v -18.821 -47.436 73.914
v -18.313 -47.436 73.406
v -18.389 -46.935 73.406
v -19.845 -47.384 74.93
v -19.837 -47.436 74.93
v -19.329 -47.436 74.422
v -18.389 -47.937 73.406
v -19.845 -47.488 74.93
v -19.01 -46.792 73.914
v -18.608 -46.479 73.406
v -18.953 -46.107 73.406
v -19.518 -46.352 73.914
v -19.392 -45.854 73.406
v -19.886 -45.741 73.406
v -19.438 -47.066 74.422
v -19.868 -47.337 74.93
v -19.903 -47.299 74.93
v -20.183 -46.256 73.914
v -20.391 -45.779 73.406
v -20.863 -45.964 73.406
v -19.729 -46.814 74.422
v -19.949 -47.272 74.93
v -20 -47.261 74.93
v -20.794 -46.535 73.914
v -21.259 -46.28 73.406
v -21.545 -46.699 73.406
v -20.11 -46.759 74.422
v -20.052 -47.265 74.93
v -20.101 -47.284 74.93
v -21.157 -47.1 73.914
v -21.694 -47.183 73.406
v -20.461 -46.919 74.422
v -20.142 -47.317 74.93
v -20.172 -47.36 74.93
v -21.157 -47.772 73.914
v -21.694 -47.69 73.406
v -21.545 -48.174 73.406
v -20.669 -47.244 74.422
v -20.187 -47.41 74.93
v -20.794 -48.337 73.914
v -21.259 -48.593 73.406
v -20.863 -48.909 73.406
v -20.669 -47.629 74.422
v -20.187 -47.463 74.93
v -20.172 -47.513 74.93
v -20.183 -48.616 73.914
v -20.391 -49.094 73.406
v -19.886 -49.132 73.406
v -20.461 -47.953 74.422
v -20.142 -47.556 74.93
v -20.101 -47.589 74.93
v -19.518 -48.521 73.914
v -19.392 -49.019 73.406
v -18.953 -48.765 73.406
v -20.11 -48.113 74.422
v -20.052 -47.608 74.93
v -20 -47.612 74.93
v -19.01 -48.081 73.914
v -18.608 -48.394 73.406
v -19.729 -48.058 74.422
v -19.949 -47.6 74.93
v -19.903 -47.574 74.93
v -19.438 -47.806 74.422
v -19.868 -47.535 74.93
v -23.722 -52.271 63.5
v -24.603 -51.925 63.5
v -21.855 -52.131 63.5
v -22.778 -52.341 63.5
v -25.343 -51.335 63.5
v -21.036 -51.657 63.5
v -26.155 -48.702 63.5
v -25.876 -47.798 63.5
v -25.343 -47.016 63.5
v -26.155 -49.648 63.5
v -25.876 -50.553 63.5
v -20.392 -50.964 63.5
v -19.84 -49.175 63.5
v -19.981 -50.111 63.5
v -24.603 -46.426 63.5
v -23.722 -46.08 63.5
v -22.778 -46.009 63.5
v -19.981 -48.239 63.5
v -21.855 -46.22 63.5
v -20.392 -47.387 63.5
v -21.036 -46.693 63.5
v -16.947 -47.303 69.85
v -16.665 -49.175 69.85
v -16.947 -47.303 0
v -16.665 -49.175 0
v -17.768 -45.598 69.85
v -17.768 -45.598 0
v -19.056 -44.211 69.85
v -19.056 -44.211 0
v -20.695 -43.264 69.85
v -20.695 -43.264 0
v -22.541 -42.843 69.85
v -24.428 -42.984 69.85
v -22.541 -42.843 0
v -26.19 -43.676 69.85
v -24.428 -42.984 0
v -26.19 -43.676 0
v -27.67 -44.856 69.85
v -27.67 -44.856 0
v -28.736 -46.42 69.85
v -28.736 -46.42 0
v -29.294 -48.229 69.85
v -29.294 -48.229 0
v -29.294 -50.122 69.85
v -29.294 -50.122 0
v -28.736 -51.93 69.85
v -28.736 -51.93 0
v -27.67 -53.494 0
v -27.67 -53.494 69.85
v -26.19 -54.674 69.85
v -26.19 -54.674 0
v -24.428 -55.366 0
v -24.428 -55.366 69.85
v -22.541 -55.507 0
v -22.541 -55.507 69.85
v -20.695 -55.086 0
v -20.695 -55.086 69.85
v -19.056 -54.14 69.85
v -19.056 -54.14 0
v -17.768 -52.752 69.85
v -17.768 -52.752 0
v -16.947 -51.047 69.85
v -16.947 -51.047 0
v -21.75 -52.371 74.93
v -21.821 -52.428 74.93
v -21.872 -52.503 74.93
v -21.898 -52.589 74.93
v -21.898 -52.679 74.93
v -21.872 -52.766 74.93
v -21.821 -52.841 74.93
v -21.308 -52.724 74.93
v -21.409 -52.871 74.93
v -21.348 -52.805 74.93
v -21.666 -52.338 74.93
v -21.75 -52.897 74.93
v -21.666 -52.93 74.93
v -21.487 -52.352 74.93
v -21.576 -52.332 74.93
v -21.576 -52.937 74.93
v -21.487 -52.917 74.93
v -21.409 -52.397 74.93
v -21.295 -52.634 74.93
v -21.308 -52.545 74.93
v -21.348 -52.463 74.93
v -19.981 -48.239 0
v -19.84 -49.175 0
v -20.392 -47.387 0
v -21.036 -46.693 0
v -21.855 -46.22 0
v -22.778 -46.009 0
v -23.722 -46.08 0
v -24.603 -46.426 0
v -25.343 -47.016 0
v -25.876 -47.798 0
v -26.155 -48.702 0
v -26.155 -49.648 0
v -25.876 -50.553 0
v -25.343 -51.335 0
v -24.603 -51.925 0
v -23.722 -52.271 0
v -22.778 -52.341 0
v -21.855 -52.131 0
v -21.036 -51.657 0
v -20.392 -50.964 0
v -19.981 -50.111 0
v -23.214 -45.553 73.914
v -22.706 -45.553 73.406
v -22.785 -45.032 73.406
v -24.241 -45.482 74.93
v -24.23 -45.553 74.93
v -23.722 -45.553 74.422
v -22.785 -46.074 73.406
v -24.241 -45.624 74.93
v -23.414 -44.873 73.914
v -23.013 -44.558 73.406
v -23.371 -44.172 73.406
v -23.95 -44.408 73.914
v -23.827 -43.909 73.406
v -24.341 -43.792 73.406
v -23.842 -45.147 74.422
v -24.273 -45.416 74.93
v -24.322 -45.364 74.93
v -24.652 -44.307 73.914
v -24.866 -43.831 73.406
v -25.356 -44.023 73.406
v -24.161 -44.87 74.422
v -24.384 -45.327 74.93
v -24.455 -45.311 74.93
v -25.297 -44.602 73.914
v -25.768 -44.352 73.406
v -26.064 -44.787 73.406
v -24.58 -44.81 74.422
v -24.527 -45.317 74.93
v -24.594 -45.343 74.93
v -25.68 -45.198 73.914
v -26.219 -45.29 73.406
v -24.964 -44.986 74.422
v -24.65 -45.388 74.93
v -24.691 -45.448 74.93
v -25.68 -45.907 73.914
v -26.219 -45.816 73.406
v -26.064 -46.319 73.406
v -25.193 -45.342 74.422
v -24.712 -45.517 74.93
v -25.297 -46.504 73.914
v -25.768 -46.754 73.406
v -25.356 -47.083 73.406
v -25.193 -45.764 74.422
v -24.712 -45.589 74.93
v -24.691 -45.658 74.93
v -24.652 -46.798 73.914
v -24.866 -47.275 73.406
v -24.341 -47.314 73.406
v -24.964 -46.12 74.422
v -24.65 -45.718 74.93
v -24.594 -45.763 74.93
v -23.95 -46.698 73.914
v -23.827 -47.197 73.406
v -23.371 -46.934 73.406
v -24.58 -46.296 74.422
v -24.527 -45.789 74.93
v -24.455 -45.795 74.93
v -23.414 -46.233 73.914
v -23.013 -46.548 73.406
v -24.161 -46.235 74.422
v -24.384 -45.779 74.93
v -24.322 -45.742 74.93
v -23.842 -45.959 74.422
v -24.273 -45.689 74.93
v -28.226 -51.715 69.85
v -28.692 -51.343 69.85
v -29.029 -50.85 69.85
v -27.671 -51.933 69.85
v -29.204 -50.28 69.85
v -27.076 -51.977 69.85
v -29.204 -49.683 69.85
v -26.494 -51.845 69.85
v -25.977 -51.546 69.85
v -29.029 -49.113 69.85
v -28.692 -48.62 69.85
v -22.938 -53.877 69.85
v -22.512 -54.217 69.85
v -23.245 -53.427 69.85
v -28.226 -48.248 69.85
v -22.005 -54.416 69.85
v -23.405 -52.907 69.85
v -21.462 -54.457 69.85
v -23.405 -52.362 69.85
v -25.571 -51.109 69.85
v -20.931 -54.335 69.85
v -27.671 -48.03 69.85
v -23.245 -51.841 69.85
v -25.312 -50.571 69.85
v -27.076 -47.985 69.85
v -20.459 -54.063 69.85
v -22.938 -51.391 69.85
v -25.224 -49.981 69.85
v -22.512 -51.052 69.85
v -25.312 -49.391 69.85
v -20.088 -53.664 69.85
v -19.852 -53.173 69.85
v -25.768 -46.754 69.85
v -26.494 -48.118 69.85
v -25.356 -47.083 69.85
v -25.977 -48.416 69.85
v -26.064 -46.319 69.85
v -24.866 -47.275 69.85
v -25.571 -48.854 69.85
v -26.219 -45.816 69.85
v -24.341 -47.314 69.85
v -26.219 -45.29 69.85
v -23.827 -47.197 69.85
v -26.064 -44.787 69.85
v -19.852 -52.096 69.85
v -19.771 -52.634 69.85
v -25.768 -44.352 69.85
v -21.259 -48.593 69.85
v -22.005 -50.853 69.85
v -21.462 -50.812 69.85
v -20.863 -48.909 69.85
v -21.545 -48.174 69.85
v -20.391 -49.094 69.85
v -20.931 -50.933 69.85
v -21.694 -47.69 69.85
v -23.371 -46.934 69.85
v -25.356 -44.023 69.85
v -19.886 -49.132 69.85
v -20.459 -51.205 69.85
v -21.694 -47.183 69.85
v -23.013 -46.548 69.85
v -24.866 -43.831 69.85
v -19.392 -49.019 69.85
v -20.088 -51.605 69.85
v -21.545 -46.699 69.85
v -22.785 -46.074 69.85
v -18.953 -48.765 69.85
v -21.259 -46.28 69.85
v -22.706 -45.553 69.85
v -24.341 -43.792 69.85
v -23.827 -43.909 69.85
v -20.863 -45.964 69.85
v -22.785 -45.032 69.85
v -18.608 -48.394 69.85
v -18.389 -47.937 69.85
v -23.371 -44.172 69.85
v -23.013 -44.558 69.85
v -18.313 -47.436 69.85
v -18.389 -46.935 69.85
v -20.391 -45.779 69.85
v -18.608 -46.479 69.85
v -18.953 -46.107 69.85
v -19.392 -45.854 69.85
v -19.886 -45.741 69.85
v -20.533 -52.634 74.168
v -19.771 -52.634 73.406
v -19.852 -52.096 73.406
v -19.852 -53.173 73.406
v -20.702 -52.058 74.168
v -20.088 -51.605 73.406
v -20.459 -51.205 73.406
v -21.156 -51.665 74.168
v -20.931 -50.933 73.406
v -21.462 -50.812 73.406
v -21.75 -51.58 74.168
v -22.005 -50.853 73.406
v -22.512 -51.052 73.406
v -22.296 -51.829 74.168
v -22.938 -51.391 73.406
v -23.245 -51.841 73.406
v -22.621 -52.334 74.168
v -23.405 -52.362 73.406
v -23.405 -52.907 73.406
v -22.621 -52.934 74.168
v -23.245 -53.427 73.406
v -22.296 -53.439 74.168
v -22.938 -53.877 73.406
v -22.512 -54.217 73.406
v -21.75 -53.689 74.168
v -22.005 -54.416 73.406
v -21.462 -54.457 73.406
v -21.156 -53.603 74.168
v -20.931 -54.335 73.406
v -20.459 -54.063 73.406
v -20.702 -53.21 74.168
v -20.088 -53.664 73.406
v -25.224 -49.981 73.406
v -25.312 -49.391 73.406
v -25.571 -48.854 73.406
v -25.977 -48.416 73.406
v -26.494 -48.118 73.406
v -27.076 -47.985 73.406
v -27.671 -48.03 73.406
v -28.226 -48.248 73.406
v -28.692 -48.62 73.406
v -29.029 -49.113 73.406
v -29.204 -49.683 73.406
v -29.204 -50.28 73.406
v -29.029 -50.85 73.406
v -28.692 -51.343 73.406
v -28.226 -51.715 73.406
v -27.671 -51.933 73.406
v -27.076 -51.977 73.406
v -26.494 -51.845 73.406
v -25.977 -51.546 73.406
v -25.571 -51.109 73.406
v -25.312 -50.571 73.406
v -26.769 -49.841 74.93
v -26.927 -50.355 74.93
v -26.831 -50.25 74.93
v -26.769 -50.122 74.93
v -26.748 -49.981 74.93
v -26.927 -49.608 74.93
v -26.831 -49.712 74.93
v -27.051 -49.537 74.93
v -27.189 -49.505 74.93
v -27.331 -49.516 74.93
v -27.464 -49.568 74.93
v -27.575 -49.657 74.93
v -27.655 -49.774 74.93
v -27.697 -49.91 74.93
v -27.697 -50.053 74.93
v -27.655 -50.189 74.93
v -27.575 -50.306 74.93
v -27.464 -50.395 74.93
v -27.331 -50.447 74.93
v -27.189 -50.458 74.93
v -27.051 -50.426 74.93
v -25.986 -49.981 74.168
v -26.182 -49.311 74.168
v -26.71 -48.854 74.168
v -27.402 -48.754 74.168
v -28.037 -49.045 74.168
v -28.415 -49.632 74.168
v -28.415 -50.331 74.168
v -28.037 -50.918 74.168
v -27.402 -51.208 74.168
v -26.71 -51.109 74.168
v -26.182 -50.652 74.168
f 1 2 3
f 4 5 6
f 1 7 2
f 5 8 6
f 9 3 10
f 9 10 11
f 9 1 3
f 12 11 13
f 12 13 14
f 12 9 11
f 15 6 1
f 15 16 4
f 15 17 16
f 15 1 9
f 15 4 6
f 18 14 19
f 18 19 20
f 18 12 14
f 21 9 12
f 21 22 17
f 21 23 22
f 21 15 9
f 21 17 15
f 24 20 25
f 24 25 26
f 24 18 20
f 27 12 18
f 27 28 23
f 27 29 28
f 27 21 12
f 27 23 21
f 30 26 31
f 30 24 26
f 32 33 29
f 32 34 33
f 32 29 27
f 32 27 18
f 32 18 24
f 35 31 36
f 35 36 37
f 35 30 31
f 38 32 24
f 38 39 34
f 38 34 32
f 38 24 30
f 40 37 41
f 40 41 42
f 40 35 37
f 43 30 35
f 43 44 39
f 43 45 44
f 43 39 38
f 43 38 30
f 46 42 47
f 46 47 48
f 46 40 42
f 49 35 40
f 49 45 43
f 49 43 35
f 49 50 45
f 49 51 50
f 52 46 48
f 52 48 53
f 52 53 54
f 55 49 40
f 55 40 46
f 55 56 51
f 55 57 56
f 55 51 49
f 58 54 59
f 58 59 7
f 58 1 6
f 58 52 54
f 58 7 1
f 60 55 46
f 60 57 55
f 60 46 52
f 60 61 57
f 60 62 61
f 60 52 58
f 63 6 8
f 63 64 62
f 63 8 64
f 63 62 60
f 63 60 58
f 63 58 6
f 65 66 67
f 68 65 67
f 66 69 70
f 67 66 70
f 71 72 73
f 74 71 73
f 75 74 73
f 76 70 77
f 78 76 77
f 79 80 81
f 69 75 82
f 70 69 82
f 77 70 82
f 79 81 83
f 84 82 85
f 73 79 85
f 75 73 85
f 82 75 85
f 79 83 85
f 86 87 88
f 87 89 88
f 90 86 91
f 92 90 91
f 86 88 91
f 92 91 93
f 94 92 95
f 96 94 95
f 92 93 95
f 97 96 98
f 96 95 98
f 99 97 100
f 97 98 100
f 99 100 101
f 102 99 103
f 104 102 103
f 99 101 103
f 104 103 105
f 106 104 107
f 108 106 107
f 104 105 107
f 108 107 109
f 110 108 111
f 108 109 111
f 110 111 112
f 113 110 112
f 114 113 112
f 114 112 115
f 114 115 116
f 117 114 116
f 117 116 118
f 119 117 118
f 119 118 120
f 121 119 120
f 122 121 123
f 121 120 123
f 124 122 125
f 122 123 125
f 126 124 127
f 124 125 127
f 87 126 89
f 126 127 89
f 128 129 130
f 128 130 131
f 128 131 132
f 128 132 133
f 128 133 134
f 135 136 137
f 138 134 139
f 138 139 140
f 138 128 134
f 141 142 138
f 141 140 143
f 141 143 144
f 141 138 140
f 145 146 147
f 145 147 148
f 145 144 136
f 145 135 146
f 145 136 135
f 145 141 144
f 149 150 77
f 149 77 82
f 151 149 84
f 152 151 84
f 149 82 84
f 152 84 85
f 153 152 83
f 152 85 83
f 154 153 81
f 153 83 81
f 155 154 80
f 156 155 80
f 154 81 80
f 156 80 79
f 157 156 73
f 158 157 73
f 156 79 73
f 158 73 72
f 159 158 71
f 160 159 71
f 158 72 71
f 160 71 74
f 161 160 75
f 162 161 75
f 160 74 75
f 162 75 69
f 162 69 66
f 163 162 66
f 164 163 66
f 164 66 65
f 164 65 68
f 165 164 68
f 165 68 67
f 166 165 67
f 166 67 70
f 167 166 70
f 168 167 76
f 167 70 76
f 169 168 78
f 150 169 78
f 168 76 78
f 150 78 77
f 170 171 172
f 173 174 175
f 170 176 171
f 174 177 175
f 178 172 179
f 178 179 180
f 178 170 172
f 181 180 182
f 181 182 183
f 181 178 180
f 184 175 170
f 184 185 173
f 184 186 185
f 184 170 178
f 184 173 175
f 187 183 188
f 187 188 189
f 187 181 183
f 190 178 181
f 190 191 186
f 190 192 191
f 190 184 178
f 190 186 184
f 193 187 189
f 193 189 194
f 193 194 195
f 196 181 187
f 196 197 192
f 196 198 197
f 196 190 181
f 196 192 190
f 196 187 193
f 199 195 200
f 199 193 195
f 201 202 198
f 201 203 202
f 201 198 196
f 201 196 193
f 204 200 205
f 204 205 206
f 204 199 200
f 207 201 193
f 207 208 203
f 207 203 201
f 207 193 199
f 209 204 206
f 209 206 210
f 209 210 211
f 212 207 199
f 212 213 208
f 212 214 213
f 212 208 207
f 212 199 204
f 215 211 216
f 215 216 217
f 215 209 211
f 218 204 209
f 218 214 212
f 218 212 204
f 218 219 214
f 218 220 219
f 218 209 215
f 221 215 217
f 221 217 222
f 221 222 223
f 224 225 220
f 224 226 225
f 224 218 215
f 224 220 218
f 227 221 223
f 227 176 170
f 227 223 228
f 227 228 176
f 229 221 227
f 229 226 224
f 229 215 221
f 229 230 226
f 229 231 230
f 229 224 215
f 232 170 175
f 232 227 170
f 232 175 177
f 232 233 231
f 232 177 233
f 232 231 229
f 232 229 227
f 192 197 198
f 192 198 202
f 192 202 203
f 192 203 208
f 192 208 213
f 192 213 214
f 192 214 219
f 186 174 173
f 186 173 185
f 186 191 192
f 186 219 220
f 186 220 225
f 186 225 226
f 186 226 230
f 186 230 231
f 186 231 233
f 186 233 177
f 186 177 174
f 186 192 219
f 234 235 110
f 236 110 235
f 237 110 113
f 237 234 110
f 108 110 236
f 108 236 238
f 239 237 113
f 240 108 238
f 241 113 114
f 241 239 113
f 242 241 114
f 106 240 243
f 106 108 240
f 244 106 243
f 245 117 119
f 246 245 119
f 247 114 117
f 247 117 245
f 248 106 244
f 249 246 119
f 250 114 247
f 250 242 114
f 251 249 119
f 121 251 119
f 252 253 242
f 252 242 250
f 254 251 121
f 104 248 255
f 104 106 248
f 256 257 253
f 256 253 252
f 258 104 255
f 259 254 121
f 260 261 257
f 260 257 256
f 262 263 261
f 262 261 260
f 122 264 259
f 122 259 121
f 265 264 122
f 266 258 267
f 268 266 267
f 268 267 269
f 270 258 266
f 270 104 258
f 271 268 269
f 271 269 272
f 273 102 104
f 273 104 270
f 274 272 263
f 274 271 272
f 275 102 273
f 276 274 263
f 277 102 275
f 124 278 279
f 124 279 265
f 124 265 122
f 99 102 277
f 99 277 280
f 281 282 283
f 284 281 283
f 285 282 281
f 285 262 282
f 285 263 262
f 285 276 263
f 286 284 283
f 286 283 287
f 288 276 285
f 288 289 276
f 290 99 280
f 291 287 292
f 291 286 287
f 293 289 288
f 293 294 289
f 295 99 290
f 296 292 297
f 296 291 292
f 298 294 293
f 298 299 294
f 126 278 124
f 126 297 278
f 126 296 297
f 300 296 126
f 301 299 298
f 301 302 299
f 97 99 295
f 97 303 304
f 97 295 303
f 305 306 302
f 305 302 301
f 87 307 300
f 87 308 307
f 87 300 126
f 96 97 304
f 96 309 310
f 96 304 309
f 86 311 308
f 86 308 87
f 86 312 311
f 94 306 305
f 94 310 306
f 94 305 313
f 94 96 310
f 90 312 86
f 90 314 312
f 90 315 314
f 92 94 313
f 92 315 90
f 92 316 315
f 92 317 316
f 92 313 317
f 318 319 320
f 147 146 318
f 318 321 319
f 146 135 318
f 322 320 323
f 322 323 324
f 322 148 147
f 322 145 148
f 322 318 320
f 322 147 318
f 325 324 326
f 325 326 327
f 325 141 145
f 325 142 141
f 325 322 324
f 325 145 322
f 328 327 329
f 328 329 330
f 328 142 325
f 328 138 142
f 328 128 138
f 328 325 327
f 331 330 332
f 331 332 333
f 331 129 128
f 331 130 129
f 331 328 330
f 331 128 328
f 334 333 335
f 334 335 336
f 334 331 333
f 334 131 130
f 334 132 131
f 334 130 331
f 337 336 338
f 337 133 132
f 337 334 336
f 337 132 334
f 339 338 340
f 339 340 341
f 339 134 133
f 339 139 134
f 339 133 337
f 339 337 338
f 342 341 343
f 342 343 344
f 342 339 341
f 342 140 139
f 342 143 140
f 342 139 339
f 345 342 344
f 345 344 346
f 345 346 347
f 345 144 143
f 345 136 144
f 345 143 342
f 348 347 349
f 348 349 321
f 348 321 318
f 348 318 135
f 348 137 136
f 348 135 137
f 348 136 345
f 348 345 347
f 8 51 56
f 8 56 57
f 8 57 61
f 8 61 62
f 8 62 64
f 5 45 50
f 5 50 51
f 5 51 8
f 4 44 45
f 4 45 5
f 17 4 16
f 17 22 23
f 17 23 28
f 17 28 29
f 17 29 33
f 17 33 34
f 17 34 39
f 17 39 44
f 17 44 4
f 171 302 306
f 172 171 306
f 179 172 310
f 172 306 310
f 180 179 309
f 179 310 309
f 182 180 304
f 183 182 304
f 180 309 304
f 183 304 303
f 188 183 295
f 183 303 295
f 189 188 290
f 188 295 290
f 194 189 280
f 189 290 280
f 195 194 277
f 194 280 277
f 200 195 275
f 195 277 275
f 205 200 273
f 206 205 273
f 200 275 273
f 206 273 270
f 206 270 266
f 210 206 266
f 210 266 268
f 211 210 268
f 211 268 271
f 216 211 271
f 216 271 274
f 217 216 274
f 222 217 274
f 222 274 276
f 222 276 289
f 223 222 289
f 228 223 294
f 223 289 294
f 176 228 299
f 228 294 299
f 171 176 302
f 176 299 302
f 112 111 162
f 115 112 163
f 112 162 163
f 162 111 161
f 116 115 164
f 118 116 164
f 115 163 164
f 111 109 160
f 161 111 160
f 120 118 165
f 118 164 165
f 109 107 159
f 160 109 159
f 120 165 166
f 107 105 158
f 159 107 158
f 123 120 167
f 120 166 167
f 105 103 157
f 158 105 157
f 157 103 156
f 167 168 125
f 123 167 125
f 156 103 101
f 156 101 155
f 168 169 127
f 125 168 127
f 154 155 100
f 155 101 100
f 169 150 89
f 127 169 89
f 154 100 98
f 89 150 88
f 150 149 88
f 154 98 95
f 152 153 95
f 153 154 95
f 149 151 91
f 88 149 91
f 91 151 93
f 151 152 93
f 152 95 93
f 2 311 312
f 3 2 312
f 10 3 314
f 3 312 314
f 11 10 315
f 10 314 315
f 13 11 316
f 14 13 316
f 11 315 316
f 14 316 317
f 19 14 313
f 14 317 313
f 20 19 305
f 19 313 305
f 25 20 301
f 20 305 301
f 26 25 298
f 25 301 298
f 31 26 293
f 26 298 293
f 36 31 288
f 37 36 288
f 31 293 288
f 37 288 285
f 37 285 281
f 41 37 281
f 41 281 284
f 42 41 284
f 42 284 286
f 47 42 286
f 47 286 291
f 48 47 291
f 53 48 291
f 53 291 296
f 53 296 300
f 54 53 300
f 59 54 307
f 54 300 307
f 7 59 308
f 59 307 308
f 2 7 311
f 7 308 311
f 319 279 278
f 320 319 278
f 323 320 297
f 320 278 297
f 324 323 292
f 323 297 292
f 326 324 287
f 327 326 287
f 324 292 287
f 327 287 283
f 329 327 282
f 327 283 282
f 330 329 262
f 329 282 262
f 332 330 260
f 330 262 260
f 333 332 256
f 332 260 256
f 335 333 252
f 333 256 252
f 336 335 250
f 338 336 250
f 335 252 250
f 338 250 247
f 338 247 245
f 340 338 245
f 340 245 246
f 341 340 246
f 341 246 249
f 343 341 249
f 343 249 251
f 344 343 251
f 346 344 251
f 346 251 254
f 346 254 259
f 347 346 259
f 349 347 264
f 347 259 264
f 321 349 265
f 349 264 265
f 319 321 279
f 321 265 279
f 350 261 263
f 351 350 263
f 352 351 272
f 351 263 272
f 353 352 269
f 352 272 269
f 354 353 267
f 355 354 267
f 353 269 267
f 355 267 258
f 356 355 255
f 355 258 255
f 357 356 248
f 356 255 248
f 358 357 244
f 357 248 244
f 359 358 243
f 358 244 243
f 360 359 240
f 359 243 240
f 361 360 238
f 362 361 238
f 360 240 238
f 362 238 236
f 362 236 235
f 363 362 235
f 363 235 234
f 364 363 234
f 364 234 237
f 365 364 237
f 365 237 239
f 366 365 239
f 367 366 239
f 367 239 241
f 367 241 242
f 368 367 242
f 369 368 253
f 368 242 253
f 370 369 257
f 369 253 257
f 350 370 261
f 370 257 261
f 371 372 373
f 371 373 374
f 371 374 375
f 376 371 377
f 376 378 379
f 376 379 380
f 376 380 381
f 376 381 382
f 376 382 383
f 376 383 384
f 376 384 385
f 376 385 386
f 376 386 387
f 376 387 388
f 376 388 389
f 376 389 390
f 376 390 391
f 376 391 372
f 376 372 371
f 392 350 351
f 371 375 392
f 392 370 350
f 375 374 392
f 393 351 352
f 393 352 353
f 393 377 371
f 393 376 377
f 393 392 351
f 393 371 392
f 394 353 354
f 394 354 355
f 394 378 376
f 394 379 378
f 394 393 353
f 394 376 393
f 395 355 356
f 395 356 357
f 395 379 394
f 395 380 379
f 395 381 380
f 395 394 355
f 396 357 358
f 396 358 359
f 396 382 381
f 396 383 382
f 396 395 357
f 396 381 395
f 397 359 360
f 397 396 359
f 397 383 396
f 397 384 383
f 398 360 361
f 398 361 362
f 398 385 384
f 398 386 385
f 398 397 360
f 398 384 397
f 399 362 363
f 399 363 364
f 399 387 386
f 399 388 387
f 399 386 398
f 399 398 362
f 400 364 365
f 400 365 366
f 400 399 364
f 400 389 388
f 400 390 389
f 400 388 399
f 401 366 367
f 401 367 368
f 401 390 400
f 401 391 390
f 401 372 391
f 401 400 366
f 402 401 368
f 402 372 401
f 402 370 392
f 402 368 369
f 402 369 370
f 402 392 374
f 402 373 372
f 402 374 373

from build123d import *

# Parameters (mm, degrees)
F0_R     = 6.35
F1_DEPTH = 63.5
F3_R     = 6.35
F4_DEPTH = 6.35
F5_D     = 6.35
F5_DEPTH = 63.5
F5_TIP   = 1.9077324654
F6_R     = 1.7663179958
F6_R_2   = 1.7000002335
F6_R_3   = 1.8274467347
F6_R_4   = 2.00164436
F7_DEPTH = 5.08
F8_SIZE  = 1.524


with BuildPart() as f1:
    # F0 (on Top) → F1 (new body)
    with BuildSketch(Plane.XY):
        with Locations((-23.0151098222, -49.1751506925)):
            Circle(F0_R)
    extrude(amount=F1_DEPTH)

    # F3 (on face) → F4 (join)
    with BuildSketch(Plane.XY.offset(63.5)):
        with Locations((-23.0151098222, -49.1751506925)):
            Circle(F3_R)
    extrude(amount=F4_DEPTH)

    # F5 (one way)
    with BuildSketch(Plane.XY.offset(63.5)):
        with Locations((-23.0151098222, -49.1751506925)):
            Circle(F5_D / 2)
    extrude(amount=-F5_DEPTH, mode=Mode.SUBTRACT)
    with Locations(Plane.XY.offset(63.5)):
        with Locations((-23.0151098222, -49.1751506925)):
            with Locations((0, 0, -(F5_DEPTH + F5_TIP / 2))):  # 118° drill point
                Cone(0, F5_D / 2, F5_TIP, mode=Mode.SUBTRACT)

    # F6 (on face) → F7 (join)
    with BuildSketch(Plane.XY.offset(69.85)):
        with Locations((-24.4727507234, -45.552957803)):
            Circle(F6_R)
        with Locations((-20.0130287558, -47.4362969398)):
            Circle(F6_R_2)
        with Locations((-21.5983316302, -52.6342540979)):
            Circle(F6_R_3)
        with Locations((-27.2251553833, -49.9814078212)):
            Circle(F6_R_4)
    extrude(amount=F7_DEPTH)

    # F8
    f8_edges = [f1.edges().sort_by_distance(p)[0] for p in [
        (-29.2268, -49.981408, 74.93),
        (-26.239069, -45.552958, 74.93),
        (-21.713029, -47.436297, 74.93),
        (-23.425778, -52.634254, 74.93),
    ]]
    chamfer(f8_edges, length=F8_SIZE)


solid = f1.part
